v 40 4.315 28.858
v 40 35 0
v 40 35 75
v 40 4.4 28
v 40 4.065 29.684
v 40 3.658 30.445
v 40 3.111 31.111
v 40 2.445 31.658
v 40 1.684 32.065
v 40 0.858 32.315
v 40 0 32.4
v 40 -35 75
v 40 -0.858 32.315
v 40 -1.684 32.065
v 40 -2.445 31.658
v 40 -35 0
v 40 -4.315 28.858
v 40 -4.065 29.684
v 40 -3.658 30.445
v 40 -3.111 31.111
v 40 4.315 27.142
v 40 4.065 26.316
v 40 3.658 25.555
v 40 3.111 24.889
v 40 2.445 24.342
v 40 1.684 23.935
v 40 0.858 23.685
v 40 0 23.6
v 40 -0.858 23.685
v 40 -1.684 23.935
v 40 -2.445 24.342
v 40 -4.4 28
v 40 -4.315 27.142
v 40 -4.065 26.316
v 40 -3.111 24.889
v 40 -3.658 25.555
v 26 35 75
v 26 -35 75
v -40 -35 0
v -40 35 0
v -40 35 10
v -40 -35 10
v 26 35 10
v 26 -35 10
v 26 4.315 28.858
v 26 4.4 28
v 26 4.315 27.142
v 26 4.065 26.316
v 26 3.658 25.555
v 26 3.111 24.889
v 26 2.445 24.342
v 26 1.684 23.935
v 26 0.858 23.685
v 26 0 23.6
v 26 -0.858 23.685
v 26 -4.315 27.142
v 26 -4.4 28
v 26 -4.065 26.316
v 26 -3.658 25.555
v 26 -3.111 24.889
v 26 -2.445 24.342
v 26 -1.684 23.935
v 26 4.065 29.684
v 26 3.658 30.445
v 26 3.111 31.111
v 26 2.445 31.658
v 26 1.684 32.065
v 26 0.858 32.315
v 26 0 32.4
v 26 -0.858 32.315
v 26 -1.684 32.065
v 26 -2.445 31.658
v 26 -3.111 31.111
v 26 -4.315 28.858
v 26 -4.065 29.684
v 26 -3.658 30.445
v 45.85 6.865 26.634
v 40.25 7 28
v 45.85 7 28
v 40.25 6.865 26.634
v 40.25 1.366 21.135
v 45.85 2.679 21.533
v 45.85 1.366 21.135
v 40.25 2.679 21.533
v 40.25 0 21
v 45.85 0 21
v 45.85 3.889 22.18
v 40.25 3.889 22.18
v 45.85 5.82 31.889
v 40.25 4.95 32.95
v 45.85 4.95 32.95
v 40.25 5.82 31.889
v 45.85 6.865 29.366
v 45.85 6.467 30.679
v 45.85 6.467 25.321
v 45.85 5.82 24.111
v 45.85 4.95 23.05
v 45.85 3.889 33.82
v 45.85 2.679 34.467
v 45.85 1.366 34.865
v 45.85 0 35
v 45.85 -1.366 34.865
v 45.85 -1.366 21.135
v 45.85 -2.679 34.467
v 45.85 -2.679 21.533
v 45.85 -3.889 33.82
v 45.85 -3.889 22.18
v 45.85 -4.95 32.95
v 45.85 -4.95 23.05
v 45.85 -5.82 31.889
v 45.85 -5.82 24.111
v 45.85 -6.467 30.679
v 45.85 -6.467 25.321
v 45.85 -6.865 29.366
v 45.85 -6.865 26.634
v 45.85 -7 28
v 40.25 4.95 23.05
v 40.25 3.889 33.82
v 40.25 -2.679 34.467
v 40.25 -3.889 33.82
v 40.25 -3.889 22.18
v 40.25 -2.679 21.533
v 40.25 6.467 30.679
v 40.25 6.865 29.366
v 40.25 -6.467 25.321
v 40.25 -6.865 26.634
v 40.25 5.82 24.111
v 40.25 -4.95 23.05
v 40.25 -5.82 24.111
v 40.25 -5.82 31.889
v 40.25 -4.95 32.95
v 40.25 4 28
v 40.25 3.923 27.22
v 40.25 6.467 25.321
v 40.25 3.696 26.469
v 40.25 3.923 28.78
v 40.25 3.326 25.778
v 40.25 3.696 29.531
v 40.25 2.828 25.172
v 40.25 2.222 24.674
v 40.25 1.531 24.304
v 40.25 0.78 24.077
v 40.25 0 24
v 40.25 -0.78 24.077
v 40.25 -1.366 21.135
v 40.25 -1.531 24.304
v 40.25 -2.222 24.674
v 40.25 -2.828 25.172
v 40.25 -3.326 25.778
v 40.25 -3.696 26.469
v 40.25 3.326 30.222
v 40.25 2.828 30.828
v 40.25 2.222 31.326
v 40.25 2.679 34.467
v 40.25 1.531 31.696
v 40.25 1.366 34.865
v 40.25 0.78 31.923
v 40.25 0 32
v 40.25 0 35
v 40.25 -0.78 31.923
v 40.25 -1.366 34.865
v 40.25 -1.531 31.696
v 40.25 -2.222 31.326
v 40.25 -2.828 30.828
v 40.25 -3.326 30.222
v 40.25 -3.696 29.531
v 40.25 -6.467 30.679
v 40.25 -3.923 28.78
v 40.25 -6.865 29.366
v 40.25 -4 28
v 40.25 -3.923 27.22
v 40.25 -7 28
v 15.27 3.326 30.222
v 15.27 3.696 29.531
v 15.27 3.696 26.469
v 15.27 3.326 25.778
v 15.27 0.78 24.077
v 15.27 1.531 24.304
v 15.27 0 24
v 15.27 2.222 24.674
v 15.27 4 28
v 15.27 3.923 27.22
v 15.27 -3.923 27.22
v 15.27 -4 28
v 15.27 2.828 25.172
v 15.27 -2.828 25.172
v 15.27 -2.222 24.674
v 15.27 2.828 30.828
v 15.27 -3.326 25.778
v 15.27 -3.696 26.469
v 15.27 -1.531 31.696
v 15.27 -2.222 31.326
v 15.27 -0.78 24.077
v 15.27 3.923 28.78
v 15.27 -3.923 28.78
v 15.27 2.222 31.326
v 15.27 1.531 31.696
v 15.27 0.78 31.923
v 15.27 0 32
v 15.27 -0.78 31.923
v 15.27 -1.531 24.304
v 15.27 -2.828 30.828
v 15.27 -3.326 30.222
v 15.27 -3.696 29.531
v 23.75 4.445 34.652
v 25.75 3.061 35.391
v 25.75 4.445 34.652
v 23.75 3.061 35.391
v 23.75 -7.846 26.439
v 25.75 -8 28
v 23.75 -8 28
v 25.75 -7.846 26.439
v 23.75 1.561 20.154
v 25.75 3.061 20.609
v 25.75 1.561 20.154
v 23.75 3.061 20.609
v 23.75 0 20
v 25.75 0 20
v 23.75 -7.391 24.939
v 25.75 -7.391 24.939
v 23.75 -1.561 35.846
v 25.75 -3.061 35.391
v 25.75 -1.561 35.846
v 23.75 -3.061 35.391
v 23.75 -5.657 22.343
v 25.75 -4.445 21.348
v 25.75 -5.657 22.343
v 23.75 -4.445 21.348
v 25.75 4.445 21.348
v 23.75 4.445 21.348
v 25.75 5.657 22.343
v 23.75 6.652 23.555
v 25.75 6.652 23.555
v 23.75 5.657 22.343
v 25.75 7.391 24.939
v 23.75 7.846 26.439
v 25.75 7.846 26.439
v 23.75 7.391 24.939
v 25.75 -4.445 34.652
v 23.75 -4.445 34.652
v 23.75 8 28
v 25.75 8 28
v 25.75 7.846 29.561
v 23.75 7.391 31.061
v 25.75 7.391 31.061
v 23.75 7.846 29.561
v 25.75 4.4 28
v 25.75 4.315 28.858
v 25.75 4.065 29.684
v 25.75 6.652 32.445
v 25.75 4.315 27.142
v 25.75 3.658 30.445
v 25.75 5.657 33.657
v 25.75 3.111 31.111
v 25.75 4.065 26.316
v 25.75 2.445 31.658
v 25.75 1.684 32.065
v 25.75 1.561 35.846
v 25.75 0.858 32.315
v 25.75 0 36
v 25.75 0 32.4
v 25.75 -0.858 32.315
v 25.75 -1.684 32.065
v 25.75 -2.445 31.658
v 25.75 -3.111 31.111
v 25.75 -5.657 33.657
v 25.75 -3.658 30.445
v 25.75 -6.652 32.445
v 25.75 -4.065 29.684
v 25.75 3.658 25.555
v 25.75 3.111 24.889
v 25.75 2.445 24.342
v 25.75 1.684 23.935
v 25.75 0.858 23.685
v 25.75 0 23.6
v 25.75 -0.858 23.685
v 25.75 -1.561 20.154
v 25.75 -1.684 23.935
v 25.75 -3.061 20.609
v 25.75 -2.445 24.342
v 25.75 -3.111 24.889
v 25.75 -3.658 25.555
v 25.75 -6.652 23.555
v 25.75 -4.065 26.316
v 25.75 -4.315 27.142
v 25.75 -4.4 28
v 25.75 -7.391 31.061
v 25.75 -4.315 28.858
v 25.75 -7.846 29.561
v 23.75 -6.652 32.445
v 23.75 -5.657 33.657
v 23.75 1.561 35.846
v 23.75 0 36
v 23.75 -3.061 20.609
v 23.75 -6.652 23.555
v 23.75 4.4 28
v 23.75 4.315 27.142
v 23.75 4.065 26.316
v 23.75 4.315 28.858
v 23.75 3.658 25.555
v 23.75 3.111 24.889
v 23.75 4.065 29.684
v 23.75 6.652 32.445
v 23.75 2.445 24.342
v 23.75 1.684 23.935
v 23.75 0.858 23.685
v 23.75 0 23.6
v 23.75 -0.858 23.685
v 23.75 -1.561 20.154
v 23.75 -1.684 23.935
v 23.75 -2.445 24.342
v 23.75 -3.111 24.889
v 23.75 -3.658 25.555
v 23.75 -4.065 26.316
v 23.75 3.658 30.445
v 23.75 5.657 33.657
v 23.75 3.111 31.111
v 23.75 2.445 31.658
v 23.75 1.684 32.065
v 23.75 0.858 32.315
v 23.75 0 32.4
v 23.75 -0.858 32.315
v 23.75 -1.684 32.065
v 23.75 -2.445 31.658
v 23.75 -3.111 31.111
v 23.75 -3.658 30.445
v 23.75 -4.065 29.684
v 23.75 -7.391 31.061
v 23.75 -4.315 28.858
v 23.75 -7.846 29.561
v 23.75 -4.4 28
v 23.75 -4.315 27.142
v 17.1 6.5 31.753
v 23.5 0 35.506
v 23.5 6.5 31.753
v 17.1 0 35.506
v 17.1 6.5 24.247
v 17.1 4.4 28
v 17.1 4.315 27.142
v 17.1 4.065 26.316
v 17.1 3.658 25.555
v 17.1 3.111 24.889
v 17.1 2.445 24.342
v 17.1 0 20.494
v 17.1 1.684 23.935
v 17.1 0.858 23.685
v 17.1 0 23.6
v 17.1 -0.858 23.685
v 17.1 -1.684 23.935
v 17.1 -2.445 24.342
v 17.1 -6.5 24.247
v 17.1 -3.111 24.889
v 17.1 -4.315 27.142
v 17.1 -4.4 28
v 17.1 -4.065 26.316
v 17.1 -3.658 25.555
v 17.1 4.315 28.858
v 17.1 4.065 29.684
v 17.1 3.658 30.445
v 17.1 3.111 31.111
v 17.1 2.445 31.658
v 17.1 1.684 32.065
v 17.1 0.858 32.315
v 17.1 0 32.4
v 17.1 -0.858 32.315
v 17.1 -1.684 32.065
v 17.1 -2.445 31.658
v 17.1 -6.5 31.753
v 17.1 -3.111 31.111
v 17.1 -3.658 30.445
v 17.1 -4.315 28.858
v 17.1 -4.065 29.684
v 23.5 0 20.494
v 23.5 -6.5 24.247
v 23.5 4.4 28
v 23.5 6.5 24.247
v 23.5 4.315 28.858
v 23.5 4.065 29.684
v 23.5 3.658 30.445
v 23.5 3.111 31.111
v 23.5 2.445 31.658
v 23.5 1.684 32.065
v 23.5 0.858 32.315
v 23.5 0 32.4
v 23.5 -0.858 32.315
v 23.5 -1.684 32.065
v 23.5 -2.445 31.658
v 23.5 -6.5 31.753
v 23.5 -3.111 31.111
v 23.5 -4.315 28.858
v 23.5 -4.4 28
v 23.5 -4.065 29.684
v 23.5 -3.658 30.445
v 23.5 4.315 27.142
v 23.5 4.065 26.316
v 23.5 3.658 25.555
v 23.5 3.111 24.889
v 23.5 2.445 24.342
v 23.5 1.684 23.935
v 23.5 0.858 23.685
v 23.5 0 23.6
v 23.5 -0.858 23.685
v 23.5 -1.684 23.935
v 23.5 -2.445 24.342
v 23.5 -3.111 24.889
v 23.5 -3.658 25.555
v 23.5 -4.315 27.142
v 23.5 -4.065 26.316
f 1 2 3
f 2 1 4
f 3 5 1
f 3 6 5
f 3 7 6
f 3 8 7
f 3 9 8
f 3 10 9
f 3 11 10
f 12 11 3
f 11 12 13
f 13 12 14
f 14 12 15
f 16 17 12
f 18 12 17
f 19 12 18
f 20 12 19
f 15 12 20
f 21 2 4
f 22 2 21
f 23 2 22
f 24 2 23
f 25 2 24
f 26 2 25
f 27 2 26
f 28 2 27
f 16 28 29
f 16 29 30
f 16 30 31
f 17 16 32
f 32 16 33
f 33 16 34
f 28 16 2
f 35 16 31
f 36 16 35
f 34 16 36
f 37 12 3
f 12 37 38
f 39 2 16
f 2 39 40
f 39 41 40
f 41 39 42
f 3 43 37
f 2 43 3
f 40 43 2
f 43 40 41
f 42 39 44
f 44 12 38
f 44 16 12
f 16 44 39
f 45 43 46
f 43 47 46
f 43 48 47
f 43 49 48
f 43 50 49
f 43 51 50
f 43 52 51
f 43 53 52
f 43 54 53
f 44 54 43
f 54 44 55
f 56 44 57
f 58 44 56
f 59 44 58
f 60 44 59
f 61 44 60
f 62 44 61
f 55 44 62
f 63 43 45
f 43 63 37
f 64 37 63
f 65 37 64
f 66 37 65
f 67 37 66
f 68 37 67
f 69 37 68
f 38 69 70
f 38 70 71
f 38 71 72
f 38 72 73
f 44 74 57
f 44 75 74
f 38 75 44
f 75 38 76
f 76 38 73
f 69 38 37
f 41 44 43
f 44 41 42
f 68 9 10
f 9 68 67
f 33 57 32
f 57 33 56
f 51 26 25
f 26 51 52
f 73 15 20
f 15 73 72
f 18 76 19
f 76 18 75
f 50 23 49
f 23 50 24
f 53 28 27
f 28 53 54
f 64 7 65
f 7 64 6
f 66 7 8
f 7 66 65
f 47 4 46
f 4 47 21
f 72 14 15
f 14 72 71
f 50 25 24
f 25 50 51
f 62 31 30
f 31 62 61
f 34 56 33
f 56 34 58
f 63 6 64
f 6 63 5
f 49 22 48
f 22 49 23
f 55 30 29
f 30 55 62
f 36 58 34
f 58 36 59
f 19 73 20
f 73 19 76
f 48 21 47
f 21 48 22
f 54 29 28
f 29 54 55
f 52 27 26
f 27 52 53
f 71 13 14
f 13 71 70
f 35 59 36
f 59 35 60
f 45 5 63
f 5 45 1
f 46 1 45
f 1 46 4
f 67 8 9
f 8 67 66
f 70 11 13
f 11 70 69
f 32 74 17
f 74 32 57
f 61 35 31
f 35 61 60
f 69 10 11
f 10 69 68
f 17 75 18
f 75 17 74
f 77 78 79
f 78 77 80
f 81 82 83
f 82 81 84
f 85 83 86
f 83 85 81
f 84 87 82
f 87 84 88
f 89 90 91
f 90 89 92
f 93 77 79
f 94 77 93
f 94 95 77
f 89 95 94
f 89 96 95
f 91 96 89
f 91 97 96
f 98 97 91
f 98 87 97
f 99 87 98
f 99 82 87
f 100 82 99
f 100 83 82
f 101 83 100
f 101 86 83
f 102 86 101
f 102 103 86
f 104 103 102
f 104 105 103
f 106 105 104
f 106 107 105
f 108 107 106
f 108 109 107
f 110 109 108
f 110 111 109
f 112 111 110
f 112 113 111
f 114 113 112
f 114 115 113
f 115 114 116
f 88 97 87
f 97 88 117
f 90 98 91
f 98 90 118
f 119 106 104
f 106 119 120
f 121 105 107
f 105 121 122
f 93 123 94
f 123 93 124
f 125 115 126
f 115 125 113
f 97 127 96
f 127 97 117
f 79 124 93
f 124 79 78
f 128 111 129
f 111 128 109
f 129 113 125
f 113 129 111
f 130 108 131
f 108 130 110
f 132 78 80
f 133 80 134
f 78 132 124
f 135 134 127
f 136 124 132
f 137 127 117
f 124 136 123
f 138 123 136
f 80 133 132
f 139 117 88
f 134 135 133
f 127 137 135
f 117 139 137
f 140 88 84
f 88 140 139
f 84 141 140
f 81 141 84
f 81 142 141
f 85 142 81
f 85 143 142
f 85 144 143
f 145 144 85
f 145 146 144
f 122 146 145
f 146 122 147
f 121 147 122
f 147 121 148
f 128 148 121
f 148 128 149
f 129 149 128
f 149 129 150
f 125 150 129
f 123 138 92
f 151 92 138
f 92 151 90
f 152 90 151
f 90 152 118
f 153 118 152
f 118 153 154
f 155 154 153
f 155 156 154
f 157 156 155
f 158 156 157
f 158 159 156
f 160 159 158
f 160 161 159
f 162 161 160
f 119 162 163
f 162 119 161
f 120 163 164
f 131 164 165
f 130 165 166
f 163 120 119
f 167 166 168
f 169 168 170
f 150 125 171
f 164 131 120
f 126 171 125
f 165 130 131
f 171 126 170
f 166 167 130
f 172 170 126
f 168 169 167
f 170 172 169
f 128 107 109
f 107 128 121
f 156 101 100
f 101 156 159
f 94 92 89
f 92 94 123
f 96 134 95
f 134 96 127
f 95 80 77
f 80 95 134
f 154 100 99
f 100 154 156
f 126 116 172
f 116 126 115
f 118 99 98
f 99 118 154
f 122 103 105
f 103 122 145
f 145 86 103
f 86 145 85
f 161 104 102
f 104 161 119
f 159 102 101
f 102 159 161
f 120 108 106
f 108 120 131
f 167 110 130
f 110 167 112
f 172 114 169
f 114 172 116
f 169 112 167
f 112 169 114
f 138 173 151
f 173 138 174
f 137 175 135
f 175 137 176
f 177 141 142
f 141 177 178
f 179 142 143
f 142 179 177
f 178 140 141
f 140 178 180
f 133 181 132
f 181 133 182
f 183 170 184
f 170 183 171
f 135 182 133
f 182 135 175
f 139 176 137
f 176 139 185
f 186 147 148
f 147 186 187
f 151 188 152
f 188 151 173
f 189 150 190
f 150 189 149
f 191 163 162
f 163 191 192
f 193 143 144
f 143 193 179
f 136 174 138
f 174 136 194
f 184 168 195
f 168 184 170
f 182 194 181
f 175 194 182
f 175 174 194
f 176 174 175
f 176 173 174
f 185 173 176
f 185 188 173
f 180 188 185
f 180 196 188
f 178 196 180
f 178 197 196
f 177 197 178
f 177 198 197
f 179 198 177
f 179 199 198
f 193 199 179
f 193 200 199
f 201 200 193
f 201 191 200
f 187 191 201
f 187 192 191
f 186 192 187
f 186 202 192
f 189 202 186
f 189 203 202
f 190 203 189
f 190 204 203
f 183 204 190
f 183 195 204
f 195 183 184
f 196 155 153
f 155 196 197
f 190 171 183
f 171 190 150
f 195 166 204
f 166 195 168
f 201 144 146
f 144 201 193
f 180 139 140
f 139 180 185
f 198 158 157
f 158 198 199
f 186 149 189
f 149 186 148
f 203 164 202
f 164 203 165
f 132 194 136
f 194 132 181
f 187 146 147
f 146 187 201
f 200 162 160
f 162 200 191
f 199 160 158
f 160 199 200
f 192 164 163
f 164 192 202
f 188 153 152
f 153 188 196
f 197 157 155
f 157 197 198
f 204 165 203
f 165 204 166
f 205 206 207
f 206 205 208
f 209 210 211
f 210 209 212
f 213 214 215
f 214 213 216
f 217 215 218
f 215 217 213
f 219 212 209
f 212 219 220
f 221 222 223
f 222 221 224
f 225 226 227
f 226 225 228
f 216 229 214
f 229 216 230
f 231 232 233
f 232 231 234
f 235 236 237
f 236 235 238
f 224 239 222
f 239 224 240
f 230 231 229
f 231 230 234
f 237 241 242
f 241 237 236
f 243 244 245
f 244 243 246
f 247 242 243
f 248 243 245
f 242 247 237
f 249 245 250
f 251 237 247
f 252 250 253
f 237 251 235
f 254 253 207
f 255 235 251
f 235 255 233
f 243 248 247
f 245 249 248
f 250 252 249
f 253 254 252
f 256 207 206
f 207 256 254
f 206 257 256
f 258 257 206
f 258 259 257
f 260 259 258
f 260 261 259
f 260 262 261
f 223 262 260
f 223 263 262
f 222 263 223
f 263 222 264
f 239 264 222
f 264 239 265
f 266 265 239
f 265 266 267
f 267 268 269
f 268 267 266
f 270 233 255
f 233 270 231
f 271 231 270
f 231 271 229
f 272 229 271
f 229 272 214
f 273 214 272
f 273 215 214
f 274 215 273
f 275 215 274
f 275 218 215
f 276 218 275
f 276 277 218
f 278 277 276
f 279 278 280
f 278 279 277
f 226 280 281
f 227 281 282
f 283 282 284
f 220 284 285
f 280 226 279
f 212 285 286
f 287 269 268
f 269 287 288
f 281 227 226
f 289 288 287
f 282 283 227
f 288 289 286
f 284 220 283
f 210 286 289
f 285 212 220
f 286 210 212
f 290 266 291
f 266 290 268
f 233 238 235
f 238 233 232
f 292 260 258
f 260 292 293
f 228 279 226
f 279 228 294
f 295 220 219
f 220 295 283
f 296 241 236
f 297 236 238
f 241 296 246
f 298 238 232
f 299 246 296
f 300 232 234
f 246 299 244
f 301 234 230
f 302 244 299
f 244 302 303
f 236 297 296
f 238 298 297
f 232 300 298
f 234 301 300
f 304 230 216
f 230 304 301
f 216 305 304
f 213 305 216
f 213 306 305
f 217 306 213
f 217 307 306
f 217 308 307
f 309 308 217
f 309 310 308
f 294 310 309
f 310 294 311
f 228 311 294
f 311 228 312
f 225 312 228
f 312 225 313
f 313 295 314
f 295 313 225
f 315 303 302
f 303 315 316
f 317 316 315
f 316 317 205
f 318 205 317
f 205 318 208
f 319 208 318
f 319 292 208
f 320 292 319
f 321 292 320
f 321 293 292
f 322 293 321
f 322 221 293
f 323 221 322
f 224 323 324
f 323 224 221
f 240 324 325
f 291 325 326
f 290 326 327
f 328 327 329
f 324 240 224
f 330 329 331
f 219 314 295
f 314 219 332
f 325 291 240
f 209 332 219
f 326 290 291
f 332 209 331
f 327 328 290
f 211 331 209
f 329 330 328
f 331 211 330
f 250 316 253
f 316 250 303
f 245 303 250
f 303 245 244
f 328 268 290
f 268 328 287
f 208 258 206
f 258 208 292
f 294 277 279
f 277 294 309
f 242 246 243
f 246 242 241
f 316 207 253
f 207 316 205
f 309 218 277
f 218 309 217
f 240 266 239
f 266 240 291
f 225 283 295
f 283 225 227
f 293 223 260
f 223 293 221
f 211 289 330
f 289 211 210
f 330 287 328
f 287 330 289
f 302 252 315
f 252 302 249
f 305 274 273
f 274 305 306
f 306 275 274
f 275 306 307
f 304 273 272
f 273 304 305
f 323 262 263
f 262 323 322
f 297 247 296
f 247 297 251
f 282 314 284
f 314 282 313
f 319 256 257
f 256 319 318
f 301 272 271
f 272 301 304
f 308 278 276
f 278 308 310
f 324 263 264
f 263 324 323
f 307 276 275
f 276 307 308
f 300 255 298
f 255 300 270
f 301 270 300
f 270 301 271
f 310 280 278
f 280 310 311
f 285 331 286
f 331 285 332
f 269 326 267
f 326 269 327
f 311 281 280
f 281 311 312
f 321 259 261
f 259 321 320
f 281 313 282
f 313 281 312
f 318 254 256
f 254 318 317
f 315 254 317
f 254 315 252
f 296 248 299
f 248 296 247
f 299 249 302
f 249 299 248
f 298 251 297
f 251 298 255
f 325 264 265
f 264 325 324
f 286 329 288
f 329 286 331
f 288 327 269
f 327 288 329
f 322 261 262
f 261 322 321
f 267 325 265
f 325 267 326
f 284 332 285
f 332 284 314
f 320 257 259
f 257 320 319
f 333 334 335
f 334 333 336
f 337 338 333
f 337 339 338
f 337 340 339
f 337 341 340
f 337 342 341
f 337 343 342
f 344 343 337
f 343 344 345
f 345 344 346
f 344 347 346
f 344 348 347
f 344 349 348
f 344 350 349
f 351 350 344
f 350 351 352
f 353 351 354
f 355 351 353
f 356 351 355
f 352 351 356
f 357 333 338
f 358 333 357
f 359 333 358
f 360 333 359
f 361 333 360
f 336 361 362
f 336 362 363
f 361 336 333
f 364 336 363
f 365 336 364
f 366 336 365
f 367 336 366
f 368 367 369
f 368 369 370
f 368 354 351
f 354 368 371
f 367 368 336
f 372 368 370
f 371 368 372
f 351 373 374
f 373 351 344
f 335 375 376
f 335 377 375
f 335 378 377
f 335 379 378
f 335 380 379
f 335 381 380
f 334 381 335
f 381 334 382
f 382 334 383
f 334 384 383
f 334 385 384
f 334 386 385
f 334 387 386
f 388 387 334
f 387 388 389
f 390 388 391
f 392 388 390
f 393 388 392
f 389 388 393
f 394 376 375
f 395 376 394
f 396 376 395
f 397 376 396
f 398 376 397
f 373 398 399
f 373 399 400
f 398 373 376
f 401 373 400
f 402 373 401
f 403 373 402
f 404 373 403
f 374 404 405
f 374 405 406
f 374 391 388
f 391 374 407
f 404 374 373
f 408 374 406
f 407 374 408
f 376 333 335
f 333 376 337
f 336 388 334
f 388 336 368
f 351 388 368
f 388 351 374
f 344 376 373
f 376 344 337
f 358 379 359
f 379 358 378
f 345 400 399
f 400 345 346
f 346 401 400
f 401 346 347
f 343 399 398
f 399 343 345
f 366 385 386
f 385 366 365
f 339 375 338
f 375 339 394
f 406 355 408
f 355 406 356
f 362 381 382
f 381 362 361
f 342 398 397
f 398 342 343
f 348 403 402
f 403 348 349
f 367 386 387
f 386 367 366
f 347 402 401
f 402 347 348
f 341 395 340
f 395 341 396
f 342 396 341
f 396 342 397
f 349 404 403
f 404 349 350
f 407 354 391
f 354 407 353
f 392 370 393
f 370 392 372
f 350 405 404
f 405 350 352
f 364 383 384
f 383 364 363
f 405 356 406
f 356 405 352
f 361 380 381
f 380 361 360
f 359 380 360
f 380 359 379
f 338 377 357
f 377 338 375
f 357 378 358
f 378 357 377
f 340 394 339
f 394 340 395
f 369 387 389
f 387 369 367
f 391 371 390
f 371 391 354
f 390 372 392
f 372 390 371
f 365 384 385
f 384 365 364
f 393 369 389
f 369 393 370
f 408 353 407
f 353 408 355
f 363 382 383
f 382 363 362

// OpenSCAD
$fn = 32;

// ------------------------------------------------------------------------
// Bolted bracket: 80 x 70 mm bracket with 1 bolt joints
// Every part is its own module, assembly() places them once.
// ------------------------------------------------------------------------

// --- part 1 ---
module bracket() {
  difference() {
    translate([-40, -35, 0]) cube([80, 70, 75]);
    translate([-41, -36, 10]) cube([67, 72, 66]);
    translate([33, 0, 28]) rotate([0, 90, 0]) cylinder(h = 16, d = 8.8, center = true);
  }
}

// --- part 2 ---
module bolt() {
  cylinder(h = 5.6, d = 14);
  translate([0, 0, -24.98]) cylinder(h = 24.98, d = 8);
}

// --- part 3 ---
module washer() {
  difference() {
      translate([0, 0, 0]) cylinder(h = 2, d = 16);
      translate([0, 0, -1]) cylinder(h = 4, d = 8.8);
    }
}

// --- part 4 ---
module nut() {
  difference() {
    linear_extrude(height = 6.4) polygon(points = [[7.506, 0], [3.753, 6.5], [-3.753, 6.5], [-7.506, 0], [-3.753, -6.5], [3.753, -6.5]]);
    translate([0, 0, -1]) cylinder(h = 8.4, d = 8.8);
  }
}

// --- assembly ---
module assembly() {
  translate([0, 0, 0]) rotate([0, 0, 0]) bracket();
  translate([40.25, 0, 28]) rotate([0, 90, 0]) bolt();
  translate([23.75, 0, 28]) rotate([0, 90, 0]) washer();
  translate([17.1, 0, 28]) rotate([0, 90, 0]) nut();
}

assembly();
